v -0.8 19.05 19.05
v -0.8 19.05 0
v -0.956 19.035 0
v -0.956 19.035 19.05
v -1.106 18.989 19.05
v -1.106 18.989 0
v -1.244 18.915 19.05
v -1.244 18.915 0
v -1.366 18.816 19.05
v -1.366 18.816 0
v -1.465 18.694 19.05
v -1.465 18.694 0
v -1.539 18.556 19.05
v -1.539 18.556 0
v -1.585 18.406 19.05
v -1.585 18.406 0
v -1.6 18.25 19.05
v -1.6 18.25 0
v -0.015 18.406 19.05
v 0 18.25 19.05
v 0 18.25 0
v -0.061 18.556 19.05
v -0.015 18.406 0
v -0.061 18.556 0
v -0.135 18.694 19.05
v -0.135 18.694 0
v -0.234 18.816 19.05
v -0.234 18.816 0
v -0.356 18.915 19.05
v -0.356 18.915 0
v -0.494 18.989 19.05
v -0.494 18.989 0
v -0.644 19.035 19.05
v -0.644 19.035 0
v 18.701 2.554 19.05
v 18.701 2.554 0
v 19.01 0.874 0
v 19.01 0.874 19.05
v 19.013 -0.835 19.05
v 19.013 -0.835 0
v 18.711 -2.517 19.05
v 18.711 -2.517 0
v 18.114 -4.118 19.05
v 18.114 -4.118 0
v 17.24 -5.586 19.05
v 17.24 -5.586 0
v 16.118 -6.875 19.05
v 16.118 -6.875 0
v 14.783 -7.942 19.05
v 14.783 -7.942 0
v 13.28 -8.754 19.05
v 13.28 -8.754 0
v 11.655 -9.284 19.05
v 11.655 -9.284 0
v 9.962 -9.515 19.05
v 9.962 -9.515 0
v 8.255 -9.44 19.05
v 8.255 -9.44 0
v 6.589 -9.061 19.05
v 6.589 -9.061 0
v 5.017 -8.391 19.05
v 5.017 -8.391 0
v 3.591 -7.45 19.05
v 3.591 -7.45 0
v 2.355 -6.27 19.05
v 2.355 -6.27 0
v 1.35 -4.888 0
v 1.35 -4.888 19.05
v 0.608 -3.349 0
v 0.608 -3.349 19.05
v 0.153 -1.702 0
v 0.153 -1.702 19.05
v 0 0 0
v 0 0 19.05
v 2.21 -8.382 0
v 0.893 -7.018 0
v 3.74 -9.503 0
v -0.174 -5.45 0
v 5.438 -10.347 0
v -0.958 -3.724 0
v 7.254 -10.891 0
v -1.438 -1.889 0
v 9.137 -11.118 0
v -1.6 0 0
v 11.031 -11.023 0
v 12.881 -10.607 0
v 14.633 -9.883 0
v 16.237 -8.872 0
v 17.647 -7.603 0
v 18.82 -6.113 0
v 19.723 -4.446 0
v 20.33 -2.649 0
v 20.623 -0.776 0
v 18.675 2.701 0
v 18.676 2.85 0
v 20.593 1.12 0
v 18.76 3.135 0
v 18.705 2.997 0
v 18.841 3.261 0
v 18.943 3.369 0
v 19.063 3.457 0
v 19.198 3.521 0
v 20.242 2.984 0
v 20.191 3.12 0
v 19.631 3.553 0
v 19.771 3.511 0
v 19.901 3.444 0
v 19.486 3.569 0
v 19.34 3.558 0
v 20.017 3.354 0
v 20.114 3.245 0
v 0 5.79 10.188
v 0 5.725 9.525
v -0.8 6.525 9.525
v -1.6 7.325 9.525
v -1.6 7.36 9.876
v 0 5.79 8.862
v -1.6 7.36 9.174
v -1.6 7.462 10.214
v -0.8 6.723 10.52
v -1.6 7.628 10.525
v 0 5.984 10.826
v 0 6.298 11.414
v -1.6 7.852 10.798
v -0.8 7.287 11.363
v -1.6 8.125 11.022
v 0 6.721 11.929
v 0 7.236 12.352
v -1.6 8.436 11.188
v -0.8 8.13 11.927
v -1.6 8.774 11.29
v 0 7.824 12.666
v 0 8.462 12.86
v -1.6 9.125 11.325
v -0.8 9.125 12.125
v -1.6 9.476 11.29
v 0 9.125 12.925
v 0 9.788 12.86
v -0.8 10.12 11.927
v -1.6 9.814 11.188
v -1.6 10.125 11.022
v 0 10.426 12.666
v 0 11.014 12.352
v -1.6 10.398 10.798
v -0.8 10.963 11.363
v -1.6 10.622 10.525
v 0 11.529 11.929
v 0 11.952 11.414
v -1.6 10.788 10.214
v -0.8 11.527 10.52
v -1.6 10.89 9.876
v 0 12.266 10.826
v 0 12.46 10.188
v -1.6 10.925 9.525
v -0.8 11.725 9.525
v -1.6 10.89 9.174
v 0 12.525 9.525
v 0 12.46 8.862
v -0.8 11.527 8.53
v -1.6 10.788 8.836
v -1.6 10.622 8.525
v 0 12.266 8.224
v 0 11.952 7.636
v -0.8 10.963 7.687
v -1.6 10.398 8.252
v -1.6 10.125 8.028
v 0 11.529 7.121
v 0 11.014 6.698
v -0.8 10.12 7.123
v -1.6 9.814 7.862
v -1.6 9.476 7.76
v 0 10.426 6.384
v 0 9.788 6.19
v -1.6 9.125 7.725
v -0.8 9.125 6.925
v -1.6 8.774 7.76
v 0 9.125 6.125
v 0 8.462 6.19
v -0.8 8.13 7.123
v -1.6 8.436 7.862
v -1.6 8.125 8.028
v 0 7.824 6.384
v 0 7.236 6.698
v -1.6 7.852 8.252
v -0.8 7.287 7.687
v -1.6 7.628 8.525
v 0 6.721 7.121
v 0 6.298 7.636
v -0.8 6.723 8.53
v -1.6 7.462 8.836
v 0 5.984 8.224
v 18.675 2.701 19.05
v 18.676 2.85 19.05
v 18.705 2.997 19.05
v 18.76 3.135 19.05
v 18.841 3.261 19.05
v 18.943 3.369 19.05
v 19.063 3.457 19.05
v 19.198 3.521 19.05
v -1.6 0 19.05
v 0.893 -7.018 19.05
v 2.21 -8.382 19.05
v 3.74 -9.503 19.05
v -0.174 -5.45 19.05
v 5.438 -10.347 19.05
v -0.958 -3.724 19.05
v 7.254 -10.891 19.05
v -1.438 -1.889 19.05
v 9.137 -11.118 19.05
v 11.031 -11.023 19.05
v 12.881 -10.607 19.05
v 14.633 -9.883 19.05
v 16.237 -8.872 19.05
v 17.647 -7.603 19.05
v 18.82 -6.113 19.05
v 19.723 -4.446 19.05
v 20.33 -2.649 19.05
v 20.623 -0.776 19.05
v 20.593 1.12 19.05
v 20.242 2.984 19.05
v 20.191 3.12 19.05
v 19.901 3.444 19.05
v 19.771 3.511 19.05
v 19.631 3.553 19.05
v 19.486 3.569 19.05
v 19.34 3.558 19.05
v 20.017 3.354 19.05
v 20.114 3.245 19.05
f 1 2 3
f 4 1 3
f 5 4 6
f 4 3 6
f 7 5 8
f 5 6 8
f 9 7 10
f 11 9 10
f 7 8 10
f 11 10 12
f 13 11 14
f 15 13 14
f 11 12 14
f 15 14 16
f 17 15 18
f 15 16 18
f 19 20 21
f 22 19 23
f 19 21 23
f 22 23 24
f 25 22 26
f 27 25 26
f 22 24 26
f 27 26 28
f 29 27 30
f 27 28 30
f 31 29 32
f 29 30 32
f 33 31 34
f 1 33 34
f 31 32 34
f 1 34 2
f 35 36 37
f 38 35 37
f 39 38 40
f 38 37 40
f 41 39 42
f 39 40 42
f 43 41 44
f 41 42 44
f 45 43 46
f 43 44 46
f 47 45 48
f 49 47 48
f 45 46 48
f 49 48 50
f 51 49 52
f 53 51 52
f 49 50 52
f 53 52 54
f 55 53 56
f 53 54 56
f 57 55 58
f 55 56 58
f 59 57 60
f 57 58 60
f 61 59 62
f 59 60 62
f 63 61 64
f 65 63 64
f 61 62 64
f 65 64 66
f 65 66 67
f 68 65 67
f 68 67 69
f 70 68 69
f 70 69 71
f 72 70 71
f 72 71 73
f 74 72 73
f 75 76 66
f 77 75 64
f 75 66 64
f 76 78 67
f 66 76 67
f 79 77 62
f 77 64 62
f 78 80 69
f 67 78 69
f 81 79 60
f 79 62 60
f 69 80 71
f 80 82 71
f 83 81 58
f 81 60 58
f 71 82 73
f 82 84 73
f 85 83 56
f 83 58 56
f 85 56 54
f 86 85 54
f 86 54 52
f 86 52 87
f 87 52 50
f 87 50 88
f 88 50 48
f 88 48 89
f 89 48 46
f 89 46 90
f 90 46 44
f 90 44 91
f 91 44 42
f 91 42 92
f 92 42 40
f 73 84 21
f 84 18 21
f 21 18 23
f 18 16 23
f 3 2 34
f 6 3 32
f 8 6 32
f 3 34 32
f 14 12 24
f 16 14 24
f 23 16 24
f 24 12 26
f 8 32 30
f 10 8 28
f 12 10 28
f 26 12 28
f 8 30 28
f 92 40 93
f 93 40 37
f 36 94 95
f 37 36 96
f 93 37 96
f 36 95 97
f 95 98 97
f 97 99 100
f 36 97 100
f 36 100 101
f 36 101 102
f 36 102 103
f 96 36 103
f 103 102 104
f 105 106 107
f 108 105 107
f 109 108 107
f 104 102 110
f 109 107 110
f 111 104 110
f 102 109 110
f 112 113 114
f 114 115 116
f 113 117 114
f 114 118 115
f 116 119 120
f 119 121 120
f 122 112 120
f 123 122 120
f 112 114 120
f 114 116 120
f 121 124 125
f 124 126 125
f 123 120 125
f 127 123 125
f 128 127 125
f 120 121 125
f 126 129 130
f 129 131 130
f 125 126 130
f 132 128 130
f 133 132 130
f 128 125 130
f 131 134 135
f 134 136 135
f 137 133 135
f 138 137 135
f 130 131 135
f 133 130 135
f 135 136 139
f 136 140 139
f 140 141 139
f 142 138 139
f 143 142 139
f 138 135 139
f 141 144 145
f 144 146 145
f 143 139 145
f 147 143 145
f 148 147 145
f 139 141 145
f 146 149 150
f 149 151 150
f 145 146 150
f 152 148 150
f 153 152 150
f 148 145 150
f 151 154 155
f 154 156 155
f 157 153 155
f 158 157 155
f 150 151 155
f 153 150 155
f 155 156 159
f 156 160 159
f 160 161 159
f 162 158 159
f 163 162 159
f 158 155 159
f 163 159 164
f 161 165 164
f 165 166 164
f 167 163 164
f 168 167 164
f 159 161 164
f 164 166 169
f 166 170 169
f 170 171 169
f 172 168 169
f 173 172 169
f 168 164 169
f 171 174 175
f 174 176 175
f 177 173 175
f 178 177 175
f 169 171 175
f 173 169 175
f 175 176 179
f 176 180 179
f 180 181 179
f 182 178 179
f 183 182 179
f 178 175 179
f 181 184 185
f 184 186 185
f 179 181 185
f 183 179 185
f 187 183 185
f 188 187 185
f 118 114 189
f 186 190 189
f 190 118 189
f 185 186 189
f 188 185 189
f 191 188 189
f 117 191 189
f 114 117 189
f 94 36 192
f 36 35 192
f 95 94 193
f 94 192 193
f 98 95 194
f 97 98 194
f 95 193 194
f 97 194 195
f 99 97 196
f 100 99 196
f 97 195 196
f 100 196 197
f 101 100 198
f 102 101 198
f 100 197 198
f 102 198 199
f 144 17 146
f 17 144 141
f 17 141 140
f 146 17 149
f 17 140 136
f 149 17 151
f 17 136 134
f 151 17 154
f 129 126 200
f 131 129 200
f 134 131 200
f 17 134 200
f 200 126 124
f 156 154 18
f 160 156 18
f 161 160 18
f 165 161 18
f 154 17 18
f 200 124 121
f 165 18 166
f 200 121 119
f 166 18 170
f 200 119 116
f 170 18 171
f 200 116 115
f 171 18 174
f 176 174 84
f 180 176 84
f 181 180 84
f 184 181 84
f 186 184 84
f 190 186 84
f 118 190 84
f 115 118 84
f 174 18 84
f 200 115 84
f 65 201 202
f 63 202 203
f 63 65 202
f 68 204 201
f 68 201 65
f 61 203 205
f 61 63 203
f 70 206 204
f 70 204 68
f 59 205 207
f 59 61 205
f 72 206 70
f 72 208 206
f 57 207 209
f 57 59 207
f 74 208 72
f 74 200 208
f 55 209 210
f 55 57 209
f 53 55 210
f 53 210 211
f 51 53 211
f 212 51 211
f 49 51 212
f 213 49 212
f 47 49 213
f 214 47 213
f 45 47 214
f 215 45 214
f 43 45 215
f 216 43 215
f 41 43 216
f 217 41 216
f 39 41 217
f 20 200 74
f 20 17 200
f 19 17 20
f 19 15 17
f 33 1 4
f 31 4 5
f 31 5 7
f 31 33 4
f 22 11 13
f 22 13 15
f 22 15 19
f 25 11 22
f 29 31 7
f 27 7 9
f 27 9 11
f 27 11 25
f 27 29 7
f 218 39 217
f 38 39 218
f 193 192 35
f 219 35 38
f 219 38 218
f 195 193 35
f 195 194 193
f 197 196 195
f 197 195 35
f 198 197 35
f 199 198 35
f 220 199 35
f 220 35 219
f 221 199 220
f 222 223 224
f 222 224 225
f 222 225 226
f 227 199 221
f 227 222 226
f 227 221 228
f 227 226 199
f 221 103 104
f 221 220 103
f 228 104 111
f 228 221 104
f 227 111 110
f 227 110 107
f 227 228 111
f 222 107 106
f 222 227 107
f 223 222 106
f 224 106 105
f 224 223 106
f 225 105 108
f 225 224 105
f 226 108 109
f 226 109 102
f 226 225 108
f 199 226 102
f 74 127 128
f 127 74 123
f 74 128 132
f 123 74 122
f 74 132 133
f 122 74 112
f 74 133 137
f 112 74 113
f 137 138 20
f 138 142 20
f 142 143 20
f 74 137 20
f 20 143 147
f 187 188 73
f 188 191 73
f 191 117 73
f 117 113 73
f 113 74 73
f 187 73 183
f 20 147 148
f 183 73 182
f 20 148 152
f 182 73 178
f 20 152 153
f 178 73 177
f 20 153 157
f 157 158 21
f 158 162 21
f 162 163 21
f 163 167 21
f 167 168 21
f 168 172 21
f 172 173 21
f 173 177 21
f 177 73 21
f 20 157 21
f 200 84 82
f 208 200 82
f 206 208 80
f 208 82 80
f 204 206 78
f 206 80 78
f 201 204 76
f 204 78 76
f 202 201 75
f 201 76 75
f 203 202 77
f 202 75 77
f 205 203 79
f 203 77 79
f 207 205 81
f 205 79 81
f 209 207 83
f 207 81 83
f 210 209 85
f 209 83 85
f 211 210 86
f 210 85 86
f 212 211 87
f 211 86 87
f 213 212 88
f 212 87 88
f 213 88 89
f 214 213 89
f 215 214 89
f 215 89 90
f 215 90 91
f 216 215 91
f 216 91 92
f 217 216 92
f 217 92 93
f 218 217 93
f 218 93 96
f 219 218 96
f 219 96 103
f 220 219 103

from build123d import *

# Parameters (mm, degrees)
F1_DEPTH       = 19.05
F2_R           = 0.79999
F4_D           = 3.4
F4_CSINK_D     = 6.8
F4_CSINK_ANGLE = 90


# Not quite as in the source:
# - a fillet or chamfer is up to 0.001 mm smaller than in the source, because OpenCascade refuses the exact size


with BuildPart() as f1:
    # F0 (on Top) → F1 (new body)
    with BuildSketch(Plane.XY):
        with BuildLine():
            ThreePointArc((18.475572213, 3.2577418652), (11.1789988923, -9.3802938474), (0, 0))
            Line((0, 0), (0, 18.25))
            ThreePointArc((0, 18.25), (-0.2343145751, 18.8156854249), (-0.8, 19.05))
            ThreePointArc((-0.8, 19.05), (-1.3656854249, 18.8156854249), (-1.6, 18.25))
            Line((-1.6, 18.25), (-1.6, 0))
            ThreePointArc((-1.6, 0), (11.4568359765, -10.9559862523), (19.9790804062, 3.8049740945))
            Line((19.9790804062, 3.8049740945), (18.475572213, 3.2577418652))
        make_face()
    extrude(amount=F1_DEPTH)

    # F2 (radius 0.8 in the source; OpenCascade refuses exactly that, so slightly less here)
    f2_edges = [f1.edges().sort_by_distance(p)[0] for p in [
        (19.97908, 3.804974, 9.525),
        (18.475572, 3.257742, 9.525),
    ]]
    fillet(f2_edges, radius=F2_R)

    # F4 (through all)
    with Locations(Plane.YZ):
        with Locations((9.125, 9.525)):
            CounterSinkHole(F4_D / 2, F4_CSINK_D / 2, counter_sink_angle=F4_CSINK_ANGLE)


solid = f1.part
